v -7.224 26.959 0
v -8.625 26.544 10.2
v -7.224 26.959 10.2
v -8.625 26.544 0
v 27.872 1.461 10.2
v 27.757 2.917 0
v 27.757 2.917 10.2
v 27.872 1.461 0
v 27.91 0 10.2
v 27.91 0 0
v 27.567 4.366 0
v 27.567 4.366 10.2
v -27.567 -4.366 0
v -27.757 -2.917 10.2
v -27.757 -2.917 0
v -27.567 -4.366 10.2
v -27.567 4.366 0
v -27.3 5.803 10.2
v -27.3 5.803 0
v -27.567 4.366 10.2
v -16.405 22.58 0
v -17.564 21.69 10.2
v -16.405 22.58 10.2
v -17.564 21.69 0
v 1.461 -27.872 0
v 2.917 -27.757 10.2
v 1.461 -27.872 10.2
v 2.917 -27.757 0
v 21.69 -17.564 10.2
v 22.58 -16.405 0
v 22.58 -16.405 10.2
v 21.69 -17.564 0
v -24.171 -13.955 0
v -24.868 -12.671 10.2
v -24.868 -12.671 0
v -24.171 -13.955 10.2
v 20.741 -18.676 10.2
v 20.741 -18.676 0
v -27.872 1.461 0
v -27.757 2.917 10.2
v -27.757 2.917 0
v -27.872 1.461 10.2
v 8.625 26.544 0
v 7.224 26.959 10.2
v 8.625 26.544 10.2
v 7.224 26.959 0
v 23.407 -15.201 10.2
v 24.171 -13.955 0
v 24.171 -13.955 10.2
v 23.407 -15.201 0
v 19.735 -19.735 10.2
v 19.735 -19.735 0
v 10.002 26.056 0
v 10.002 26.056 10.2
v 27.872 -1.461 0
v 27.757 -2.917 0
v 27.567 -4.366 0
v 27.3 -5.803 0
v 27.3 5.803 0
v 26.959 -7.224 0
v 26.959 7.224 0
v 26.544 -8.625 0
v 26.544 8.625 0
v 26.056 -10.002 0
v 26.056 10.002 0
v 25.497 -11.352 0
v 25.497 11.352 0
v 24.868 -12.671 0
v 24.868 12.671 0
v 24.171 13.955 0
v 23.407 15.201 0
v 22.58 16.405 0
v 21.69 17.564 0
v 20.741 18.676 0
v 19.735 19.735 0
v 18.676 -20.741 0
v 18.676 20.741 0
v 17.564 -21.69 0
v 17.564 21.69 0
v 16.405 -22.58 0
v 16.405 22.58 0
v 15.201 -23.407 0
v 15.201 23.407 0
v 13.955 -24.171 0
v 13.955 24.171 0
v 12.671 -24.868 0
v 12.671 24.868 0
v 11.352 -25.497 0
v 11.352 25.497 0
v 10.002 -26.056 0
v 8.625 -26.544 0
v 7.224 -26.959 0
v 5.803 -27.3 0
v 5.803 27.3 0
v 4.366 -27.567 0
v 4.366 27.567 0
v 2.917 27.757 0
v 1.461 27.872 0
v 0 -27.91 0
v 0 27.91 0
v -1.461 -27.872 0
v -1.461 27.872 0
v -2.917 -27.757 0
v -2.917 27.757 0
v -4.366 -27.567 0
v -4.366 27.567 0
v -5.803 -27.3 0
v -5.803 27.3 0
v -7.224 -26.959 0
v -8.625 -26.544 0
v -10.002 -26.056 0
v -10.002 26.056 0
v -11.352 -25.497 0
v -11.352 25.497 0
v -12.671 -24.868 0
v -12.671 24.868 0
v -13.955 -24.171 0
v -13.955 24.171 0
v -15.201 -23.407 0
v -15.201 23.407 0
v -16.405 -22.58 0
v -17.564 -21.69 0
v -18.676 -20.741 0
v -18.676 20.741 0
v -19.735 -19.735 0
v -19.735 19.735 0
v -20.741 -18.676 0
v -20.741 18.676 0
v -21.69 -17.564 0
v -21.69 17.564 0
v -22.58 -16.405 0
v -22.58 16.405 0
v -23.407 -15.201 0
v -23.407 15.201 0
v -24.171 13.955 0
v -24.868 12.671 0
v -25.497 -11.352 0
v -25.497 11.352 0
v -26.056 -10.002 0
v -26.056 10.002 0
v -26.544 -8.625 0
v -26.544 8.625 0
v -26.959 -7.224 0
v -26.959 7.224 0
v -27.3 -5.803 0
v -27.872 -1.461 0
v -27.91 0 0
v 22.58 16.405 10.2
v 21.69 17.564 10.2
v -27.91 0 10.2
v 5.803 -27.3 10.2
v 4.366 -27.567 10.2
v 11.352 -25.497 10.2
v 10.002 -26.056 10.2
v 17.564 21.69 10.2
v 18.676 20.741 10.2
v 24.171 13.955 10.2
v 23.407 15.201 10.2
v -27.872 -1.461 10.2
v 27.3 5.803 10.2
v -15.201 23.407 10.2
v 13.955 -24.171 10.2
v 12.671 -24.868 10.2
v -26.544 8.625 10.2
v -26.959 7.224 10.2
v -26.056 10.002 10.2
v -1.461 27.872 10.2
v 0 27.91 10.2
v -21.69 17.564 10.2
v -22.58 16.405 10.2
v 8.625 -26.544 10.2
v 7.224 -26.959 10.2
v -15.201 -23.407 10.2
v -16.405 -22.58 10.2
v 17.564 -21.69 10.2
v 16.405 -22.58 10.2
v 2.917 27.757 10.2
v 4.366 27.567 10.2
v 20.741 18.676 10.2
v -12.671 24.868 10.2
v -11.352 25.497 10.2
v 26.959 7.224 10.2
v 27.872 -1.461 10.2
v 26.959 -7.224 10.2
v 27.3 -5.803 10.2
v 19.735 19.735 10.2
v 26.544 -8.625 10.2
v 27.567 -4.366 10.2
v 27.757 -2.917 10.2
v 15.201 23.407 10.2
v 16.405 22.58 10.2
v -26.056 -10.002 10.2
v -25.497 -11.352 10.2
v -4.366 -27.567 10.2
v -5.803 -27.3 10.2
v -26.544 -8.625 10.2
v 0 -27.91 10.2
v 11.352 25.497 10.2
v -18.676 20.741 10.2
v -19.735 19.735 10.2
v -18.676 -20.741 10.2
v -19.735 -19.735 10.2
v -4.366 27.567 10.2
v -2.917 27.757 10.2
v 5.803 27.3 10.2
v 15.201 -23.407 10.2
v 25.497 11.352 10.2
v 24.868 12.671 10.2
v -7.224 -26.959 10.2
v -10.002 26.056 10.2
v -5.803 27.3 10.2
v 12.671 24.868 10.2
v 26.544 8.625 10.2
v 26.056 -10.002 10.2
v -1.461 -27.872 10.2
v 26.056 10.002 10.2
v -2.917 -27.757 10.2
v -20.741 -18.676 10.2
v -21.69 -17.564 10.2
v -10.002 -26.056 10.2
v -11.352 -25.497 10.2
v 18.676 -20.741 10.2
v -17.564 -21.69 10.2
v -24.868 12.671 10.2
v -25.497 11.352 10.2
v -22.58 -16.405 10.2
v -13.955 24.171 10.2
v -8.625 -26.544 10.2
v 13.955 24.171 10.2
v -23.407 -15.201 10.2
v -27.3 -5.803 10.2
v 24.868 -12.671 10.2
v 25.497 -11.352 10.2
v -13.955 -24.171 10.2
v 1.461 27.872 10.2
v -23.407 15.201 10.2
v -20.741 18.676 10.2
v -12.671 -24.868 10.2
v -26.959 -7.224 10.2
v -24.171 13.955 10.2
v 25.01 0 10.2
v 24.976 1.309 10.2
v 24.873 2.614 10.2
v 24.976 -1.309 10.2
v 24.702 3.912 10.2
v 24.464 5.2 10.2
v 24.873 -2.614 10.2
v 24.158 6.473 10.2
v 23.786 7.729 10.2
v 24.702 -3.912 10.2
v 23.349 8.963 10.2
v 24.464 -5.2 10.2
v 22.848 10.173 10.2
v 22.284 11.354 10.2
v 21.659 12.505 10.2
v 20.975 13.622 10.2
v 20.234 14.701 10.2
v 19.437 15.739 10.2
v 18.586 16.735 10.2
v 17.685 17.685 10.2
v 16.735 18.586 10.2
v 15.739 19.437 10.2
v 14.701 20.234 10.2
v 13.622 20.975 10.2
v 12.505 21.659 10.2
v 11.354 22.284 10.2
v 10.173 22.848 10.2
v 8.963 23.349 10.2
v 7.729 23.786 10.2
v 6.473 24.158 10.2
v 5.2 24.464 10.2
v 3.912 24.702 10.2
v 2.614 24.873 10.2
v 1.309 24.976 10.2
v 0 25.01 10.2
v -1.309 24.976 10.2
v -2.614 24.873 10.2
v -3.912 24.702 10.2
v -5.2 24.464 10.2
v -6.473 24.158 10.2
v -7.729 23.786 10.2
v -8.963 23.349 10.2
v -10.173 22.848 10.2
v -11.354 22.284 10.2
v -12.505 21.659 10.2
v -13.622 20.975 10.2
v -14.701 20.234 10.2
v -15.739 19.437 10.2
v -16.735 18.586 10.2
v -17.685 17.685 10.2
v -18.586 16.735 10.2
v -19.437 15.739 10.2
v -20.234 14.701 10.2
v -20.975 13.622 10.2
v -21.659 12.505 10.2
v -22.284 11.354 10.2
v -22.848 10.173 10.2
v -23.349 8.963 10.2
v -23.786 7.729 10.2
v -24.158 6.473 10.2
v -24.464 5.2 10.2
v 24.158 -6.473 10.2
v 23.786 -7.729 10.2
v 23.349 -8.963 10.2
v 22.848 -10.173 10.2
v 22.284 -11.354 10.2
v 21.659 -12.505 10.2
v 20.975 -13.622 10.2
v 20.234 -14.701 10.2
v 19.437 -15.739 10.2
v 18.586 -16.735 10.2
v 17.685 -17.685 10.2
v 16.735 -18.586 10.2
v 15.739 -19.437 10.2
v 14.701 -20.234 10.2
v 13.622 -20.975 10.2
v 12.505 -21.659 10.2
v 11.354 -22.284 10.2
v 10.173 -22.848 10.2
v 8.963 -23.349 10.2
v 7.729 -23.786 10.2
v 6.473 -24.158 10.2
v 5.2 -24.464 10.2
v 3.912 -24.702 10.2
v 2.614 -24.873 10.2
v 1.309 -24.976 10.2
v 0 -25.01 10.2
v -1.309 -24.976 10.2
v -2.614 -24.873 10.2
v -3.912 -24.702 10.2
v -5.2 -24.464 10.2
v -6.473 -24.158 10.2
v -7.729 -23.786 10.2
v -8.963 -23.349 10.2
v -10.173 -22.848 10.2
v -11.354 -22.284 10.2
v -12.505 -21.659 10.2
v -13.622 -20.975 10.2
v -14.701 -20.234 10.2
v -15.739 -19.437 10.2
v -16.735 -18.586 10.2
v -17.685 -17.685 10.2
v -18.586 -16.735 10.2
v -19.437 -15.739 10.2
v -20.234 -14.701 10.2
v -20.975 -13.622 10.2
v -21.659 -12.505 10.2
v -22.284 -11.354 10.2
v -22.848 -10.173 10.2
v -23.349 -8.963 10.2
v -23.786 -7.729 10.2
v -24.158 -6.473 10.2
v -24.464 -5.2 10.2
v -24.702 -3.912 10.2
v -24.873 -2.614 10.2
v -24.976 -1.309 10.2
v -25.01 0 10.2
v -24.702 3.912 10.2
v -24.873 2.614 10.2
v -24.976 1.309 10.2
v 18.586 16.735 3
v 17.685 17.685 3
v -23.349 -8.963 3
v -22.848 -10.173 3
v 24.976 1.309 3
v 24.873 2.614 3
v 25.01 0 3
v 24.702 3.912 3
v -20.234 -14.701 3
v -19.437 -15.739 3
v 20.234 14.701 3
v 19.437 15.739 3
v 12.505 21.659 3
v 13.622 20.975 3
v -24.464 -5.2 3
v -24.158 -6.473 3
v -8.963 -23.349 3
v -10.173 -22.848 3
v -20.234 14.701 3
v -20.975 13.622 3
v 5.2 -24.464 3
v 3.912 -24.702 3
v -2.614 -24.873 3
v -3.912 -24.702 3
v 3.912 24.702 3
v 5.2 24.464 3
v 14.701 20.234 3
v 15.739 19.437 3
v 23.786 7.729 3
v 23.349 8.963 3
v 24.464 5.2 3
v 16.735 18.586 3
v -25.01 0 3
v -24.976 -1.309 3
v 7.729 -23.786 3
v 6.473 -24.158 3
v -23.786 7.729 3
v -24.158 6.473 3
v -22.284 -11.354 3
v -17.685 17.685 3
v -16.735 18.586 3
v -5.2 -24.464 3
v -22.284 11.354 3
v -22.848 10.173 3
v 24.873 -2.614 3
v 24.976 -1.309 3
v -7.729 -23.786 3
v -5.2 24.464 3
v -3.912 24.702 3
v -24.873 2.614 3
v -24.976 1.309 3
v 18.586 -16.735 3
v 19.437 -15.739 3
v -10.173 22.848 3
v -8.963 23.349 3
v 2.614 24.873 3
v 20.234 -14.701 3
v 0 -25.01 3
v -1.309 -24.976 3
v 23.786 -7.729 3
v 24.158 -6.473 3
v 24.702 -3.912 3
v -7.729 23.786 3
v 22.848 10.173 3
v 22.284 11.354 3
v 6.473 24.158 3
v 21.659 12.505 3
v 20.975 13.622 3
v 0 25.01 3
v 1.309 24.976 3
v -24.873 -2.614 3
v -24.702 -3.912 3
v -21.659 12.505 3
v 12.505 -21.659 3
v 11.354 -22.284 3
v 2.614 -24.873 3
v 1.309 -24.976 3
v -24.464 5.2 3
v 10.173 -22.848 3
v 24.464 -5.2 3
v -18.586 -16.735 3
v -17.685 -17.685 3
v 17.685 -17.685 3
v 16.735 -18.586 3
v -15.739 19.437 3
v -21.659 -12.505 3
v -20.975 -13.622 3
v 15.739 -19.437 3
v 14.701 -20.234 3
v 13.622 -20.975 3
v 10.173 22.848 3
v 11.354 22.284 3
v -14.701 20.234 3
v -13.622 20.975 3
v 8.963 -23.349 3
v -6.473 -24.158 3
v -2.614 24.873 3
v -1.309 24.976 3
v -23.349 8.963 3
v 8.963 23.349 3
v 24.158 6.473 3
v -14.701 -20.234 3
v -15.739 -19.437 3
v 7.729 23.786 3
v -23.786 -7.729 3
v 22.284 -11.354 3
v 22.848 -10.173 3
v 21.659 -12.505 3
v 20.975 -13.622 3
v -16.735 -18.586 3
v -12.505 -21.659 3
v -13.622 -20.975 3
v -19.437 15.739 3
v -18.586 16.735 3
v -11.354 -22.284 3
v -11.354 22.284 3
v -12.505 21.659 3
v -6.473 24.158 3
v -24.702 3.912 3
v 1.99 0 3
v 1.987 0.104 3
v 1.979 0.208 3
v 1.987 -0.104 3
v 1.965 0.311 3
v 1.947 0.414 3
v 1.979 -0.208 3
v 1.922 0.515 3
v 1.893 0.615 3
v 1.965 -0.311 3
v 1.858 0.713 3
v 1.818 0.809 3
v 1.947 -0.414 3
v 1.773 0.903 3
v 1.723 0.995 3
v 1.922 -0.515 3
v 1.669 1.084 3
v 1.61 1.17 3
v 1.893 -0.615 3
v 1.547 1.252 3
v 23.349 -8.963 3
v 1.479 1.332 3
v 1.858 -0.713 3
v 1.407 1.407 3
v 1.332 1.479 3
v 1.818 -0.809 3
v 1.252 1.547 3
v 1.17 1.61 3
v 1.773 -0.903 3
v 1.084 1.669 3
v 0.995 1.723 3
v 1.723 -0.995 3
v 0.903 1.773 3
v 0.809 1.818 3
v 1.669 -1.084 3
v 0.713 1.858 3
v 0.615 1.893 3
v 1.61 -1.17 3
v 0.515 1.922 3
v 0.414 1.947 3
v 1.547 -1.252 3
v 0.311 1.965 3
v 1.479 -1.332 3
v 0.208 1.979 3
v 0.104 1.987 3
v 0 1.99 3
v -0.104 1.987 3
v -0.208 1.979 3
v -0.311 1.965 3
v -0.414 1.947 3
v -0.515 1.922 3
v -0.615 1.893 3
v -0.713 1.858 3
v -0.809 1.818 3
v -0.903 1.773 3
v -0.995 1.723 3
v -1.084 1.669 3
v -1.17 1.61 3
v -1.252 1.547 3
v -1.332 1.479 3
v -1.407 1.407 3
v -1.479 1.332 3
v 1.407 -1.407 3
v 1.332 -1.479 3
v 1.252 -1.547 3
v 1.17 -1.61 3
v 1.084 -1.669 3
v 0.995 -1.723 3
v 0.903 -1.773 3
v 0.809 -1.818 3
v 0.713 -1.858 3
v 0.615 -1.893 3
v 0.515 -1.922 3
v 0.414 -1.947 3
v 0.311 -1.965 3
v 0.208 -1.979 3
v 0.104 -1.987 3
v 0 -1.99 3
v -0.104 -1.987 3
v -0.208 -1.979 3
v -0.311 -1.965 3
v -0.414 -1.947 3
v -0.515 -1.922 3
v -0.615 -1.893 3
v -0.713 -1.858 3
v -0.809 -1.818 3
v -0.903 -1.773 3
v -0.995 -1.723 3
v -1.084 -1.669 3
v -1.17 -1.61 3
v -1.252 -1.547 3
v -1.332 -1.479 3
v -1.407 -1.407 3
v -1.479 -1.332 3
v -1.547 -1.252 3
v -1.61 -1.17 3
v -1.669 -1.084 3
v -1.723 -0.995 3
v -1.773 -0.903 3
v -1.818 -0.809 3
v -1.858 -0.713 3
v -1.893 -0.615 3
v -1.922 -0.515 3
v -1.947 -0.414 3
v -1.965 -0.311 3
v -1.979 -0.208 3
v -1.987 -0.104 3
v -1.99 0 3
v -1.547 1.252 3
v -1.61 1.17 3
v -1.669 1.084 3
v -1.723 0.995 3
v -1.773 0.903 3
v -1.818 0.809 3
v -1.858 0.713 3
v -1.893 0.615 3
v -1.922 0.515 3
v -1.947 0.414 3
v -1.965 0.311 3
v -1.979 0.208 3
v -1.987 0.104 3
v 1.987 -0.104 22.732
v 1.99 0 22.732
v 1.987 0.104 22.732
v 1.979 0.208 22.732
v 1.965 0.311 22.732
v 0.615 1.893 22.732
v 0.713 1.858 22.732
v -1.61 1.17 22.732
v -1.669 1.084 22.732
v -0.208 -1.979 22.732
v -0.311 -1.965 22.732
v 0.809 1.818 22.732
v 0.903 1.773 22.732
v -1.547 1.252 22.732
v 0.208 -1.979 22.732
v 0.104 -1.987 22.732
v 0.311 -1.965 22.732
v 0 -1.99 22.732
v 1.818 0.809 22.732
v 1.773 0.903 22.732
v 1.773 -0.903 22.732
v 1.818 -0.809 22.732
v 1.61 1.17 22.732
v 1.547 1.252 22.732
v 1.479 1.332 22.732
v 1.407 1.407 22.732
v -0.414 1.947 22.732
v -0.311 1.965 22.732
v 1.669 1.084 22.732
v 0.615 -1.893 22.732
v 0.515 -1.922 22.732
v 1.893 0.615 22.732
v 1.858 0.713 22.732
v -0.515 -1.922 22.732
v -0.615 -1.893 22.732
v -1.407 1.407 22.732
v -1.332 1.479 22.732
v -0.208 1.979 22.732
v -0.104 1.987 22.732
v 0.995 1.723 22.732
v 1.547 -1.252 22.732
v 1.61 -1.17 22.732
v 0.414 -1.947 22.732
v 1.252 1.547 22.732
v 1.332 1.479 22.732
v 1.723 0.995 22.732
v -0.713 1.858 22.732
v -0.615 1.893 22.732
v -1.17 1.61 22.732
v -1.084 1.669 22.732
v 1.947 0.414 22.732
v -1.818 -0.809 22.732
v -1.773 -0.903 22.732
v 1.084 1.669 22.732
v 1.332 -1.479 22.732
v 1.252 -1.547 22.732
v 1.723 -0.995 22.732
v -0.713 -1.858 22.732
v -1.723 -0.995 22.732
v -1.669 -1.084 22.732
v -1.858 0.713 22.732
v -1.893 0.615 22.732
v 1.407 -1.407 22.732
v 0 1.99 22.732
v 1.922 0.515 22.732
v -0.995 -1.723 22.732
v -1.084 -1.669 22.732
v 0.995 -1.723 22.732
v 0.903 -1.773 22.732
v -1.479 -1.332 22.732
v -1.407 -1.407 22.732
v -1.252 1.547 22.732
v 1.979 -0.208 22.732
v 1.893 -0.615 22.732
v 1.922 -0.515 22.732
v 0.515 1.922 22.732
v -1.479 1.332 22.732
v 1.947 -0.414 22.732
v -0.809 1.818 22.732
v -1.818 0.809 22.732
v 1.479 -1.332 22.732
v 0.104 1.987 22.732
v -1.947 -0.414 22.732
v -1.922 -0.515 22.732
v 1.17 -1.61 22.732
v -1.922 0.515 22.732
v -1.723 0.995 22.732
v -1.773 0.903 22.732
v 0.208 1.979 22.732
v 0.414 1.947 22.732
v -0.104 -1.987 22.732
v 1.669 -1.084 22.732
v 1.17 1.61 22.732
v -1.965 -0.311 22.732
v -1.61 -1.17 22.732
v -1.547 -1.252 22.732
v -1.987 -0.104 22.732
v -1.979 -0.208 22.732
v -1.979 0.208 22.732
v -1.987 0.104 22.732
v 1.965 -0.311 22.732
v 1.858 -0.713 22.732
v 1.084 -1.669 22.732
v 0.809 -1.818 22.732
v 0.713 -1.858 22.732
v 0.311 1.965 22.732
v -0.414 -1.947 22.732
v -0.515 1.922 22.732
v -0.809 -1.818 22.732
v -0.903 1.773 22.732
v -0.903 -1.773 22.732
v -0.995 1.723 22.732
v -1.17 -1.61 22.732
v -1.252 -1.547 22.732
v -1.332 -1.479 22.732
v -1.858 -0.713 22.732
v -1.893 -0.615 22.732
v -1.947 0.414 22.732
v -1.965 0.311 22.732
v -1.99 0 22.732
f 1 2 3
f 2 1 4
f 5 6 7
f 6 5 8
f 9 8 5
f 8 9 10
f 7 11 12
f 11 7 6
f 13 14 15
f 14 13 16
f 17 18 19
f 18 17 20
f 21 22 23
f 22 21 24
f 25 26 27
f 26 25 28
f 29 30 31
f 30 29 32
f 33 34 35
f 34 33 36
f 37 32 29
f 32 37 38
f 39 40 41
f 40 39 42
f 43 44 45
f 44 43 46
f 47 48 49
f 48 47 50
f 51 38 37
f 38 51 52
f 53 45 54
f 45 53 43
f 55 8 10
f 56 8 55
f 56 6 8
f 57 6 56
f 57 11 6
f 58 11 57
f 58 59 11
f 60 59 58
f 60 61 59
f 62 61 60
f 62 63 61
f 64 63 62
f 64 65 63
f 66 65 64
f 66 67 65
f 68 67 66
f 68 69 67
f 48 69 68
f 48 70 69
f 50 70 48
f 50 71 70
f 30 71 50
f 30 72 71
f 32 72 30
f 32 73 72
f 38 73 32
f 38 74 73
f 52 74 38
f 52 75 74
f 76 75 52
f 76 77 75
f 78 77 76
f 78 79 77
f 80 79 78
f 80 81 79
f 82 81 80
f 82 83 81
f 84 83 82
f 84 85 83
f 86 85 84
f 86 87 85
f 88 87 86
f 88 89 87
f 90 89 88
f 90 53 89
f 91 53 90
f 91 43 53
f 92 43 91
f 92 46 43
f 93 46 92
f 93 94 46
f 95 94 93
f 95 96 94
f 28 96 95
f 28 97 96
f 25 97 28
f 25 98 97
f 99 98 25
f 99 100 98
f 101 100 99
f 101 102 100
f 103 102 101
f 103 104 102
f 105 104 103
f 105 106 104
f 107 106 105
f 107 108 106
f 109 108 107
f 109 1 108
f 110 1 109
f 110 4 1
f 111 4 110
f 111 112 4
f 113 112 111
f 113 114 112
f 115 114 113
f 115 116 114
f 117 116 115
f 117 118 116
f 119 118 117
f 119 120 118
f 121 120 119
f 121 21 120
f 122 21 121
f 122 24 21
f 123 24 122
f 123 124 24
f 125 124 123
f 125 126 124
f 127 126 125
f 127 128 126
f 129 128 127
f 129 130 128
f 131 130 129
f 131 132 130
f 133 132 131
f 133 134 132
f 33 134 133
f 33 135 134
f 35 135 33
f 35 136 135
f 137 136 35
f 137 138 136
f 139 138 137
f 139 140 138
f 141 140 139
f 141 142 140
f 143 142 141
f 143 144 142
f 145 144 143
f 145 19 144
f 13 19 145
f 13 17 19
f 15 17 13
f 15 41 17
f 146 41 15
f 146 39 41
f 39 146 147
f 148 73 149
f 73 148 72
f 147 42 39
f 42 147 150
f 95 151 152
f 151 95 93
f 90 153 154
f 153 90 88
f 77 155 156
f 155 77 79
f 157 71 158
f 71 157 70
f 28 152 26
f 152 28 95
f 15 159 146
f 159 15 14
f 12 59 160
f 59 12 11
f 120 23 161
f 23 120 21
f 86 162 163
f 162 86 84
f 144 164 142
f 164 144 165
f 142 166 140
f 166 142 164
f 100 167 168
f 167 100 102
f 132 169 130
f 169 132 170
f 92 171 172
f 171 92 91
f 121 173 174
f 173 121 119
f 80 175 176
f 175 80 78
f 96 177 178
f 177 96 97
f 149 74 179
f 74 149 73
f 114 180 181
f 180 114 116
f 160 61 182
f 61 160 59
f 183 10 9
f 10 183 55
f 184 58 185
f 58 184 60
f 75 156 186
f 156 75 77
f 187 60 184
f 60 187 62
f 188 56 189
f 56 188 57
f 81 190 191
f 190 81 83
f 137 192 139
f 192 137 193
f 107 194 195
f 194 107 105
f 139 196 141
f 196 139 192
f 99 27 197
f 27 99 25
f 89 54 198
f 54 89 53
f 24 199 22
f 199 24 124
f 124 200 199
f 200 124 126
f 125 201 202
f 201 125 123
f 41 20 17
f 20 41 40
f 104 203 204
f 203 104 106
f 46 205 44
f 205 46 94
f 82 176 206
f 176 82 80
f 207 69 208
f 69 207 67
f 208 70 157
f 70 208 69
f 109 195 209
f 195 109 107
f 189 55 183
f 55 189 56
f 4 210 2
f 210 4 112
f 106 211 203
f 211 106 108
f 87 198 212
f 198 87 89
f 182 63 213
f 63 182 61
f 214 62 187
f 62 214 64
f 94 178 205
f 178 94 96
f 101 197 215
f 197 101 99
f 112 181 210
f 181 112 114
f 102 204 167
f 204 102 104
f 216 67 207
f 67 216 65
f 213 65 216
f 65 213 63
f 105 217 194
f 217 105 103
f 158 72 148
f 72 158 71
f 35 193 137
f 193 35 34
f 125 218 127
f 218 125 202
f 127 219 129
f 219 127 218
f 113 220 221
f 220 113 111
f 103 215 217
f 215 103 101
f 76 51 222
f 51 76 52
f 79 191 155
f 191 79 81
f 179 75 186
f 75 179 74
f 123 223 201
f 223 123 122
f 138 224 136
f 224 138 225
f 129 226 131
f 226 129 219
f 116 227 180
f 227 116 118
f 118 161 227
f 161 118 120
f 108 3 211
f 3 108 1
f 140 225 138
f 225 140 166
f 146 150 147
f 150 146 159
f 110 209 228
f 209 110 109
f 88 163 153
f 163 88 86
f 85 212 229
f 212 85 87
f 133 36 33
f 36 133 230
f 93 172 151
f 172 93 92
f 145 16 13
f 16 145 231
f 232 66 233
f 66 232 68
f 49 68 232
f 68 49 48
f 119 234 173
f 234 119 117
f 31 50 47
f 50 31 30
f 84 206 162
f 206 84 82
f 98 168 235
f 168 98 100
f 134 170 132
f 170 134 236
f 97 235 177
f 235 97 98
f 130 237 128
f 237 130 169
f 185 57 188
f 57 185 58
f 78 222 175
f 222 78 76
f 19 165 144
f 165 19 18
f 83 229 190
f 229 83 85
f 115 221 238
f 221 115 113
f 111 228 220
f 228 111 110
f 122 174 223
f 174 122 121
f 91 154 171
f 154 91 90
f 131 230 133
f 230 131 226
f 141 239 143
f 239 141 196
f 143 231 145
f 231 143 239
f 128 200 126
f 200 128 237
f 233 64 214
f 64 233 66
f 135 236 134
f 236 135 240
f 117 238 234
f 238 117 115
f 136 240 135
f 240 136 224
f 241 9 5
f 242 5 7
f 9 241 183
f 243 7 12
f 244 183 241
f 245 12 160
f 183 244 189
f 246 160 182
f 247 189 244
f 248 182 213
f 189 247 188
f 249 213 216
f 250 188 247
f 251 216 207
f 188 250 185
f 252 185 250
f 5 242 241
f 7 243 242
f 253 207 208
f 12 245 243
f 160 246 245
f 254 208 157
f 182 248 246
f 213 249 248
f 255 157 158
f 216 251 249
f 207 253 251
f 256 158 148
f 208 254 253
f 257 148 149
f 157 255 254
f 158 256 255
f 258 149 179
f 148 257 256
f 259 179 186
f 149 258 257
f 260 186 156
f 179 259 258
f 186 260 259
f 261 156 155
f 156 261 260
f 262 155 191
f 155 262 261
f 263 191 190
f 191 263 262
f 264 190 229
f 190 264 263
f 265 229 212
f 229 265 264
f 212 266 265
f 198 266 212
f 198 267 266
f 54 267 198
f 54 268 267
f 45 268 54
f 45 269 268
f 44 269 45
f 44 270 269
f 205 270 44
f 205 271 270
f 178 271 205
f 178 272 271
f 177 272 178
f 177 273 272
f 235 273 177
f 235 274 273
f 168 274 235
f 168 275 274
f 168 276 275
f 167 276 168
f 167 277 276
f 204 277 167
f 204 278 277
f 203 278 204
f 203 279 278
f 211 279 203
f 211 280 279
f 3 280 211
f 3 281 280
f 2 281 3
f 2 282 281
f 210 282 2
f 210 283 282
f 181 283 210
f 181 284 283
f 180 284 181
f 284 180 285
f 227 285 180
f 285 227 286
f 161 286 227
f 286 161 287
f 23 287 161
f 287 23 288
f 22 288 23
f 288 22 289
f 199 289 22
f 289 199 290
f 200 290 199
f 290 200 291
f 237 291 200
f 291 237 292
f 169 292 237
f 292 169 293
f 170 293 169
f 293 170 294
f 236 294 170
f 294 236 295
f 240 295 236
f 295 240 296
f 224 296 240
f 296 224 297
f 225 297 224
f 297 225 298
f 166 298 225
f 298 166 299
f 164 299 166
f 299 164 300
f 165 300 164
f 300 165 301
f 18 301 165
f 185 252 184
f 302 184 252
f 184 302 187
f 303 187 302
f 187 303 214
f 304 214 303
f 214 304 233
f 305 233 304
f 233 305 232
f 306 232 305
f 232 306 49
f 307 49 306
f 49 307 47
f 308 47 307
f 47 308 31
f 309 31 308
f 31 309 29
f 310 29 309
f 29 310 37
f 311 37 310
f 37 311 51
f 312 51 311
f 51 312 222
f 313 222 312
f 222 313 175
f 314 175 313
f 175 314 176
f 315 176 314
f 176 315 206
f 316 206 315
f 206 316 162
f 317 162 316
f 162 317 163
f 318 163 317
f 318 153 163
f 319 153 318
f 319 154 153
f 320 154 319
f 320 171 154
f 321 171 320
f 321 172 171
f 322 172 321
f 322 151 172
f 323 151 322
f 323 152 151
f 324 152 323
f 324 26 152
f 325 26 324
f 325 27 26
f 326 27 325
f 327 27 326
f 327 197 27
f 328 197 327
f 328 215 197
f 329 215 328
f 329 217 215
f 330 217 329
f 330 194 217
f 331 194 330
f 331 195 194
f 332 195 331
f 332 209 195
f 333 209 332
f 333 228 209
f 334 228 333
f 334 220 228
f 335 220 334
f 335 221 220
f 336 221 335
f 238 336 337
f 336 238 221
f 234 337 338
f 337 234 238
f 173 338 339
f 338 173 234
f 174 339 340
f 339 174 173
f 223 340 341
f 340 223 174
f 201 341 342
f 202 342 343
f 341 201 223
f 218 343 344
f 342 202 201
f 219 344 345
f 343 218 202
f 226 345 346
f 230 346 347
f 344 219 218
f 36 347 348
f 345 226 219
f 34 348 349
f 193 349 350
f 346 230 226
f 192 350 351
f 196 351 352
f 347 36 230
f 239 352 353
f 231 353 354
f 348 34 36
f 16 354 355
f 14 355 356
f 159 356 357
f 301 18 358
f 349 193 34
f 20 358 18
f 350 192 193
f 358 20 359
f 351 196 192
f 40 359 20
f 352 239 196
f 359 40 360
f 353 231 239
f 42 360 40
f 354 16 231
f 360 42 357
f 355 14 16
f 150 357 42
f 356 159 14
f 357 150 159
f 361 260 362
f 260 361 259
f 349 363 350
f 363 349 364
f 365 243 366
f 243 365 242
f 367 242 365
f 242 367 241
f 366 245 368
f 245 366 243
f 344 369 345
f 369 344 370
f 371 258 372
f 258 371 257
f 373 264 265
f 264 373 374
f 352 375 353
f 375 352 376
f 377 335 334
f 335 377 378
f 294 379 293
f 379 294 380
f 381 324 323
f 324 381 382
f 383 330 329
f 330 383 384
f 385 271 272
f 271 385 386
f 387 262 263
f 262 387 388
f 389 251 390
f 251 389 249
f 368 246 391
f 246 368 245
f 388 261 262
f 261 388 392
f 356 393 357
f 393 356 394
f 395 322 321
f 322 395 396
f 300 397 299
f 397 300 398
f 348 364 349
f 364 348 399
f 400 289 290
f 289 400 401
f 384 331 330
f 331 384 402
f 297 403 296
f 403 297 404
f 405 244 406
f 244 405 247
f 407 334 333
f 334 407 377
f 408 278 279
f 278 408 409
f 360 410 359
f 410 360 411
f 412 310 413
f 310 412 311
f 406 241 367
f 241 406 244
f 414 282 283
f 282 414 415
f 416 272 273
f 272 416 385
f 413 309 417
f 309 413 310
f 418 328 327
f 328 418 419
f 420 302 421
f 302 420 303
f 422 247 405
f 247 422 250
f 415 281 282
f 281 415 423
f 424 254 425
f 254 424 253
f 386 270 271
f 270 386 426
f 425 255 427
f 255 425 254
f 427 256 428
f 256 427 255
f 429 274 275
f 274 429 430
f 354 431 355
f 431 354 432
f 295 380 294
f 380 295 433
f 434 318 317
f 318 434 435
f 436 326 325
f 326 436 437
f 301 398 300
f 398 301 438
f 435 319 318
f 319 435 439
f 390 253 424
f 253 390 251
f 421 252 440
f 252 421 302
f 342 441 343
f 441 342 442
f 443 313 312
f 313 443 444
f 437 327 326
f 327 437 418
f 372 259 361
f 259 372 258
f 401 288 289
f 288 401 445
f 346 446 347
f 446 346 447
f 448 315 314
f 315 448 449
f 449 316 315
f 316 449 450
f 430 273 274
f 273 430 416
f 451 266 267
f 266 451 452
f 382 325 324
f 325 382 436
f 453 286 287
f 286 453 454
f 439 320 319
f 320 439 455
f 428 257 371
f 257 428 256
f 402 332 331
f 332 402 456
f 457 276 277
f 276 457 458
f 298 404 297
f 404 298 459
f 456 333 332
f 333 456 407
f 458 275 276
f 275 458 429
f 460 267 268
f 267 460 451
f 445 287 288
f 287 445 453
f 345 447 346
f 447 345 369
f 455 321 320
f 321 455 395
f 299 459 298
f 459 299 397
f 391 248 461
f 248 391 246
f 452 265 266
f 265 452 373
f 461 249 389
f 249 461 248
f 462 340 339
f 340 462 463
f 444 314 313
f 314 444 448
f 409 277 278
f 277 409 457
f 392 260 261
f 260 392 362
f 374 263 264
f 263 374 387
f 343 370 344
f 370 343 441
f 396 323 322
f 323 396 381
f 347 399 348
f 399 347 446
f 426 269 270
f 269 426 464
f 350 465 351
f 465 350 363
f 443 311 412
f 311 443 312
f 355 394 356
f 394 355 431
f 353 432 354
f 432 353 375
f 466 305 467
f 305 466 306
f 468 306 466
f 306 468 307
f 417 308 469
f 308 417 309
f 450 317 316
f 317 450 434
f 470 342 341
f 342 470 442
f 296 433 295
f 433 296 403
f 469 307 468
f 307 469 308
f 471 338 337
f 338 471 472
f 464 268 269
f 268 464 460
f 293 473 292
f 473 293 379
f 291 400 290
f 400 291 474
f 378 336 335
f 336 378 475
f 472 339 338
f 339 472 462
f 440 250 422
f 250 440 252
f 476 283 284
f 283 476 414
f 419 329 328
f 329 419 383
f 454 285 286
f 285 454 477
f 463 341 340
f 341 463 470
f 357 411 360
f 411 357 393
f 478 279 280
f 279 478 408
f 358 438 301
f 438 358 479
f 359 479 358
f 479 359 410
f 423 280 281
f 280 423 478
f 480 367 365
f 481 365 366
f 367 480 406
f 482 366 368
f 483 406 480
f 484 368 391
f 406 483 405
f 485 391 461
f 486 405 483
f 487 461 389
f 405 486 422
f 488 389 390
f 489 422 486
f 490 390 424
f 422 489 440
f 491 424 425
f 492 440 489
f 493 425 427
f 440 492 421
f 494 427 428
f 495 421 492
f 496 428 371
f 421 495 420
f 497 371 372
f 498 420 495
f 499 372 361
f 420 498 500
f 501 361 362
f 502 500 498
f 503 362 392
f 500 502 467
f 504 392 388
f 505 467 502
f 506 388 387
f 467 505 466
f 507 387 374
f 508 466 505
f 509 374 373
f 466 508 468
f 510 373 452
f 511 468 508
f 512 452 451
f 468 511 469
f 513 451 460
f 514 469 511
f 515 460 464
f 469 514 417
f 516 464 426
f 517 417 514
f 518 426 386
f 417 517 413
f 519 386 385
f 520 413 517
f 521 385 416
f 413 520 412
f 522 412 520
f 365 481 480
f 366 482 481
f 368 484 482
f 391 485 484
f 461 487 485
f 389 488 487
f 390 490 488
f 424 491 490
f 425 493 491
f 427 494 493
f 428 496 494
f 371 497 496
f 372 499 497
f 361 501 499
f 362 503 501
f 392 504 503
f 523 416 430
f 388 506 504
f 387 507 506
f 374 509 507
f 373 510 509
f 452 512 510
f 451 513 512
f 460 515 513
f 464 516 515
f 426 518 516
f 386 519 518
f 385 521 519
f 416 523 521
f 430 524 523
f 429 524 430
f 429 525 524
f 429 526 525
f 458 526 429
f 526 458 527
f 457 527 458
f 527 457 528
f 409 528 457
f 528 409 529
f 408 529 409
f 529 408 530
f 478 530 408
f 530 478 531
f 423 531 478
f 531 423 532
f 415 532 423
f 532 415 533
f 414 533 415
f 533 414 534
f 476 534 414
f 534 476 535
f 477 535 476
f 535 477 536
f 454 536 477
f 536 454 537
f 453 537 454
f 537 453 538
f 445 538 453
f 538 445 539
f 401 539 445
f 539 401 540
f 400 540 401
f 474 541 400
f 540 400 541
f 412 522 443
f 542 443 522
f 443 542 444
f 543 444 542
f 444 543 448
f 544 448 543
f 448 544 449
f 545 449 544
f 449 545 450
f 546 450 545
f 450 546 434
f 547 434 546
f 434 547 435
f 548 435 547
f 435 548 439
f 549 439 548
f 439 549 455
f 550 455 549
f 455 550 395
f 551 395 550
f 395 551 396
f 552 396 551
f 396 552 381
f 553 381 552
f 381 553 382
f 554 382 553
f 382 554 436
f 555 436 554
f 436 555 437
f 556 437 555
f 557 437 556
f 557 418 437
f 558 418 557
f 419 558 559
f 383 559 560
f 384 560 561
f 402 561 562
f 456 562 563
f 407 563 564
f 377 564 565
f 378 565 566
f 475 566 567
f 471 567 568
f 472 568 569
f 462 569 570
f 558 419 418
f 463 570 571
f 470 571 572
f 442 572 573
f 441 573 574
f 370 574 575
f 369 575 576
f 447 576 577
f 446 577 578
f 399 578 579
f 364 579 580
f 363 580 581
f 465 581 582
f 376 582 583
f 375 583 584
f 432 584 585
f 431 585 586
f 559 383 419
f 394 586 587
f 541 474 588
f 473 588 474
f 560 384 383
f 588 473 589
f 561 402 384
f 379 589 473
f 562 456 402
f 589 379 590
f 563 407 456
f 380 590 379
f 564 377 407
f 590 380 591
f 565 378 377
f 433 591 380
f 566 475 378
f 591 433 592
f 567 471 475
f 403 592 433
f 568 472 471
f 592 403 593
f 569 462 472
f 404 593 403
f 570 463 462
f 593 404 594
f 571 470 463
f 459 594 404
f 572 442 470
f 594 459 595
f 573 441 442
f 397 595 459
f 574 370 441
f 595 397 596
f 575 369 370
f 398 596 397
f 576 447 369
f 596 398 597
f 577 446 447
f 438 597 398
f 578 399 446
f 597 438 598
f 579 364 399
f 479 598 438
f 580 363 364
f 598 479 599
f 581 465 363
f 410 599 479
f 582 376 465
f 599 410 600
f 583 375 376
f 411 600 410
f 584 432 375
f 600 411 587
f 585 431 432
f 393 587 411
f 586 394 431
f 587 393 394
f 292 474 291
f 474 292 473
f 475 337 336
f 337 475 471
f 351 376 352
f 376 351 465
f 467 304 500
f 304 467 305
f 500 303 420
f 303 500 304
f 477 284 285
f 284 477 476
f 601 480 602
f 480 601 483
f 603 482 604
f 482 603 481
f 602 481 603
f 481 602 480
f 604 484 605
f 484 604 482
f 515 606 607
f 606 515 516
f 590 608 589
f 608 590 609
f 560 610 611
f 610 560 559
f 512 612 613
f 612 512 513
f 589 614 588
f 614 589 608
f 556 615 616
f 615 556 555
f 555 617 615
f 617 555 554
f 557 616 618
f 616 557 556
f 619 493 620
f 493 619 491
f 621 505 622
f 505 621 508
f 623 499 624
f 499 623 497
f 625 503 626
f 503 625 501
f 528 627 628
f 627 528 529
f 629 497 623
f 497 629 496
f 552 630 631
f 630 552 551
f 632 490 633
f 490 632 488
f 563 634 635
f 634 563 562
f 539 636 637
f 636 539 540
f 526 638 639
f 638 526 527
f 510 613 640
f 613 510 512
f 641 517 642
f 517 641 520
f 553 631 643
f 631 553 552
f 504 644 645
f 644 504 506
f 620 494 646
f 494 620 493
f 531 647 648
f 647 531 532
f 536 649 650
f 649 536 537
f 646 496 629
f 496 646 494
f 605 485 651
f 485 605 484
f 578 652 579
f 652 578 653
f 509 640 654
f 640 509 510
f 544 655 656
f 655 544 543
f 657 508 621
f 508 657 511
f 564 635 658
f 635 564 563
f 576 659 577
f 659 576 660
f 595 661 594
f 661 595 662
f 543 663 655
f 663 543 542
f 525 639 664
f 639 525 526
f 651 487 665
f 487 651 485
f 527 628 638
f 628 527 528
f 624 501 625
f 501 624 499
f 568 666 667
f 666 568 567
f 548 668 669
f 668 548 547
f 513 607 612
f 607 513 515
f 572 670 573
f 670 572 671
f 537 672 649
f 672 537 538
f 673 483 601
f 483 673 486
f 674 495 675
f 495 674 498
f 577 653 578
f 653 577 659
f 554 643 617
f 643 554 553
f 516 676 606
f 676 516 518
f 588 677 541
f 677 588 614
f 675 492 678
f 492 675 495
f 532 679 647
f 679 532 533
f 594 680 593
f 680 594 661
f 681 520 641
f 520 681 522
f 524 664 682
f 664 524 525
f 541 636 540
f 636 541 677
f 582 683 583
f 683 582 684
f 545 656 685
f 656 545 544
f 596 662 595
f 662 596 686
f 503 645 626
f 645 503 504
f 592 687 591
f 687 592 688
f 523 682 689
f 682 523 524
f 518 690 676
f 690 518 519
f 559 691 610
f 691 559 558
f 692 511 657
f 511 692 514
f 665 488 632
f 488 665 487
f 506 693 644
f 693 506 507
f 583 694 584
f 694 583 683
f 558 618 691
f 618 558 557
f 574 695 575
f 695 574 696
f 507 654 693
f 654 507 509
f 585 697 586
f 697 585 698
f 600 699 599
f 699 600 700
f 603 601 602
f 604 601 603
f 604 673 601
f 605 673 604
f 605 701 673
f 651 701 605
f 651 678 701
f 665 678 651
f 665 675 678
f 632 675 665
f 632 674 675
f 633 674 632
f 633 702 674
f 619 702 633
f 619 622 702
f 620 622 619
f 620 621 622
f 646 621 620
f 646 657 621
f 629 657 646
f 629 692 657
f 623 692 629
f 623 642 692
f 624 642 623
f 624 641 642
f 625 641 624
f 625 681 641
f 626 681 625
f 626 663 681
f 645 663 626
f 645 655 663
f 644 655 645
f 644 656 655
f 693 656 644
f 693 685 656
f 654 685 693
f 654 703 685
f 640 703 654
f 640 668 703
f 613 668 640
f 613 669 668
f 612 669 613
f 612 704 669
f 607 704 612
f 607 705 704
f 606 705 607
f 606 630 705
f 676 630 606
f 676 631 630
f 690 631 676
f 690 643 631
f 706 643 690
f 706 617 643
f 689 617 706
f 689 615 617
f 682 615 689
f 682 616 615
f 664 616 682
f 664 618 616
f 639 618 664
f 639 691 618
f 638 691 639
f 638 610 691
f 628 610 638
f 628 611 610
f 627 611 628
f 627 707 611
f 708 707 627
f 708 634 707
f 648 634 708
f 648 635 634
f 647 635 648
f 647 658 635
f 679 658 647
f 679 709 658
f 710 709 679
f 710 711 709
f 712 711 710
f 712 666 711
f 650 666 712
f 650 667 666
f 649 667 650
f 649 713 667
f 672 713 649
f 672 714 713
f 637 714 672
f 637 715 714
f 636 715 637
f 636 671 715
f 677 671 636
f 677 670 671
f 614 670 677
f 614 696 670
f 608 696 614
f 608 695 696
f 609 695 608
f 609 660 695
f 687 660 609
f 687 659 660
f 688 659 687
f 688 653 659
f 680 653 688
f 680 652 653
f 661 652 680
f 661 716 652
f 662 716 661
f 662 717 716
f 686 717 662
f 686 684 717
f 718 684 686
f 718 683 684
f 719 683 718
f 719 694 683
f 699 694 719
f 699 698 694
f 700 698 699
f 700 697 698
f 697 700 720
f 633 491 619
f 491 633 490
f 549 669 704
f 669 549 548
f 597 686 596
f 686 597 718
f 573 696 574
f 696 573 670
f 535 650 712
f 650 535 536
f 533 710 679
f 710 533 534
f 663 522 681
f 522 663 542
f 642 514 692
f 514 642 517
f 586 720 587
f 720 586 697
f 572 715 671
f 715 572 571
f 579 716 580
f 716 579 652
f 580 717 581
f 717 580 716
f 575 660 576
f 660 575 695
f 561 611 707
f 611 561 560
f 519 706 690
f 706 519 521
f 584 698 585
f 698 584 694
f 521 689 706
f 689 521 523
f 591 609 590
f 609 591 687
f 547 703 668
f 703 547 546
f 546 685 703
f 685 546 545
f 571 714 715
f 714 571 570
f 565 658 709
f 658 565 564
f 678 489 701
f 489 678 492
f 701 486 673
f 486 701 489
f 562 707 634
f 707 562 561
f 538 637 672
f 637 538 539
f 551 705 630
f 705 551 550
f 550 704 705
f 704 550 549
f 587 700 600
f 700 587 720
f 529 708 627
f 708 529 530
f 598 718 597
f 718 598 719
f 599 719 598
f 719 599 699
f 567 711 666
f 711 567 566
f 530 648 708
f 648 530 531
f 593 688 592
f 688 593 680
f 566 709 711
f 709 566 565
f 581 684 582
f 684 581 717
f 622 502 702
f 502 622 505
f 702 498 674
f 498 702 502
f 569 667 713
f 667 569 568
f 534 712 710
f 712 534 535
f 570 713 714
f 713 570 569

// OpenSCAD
// DS-I · util_concentricidad (M6). Generado por motor/fabricacion/gen_cad.py
include <ds_i_motor_params.scad>
include <motor_lib.scad>
ring_glue_jig();
